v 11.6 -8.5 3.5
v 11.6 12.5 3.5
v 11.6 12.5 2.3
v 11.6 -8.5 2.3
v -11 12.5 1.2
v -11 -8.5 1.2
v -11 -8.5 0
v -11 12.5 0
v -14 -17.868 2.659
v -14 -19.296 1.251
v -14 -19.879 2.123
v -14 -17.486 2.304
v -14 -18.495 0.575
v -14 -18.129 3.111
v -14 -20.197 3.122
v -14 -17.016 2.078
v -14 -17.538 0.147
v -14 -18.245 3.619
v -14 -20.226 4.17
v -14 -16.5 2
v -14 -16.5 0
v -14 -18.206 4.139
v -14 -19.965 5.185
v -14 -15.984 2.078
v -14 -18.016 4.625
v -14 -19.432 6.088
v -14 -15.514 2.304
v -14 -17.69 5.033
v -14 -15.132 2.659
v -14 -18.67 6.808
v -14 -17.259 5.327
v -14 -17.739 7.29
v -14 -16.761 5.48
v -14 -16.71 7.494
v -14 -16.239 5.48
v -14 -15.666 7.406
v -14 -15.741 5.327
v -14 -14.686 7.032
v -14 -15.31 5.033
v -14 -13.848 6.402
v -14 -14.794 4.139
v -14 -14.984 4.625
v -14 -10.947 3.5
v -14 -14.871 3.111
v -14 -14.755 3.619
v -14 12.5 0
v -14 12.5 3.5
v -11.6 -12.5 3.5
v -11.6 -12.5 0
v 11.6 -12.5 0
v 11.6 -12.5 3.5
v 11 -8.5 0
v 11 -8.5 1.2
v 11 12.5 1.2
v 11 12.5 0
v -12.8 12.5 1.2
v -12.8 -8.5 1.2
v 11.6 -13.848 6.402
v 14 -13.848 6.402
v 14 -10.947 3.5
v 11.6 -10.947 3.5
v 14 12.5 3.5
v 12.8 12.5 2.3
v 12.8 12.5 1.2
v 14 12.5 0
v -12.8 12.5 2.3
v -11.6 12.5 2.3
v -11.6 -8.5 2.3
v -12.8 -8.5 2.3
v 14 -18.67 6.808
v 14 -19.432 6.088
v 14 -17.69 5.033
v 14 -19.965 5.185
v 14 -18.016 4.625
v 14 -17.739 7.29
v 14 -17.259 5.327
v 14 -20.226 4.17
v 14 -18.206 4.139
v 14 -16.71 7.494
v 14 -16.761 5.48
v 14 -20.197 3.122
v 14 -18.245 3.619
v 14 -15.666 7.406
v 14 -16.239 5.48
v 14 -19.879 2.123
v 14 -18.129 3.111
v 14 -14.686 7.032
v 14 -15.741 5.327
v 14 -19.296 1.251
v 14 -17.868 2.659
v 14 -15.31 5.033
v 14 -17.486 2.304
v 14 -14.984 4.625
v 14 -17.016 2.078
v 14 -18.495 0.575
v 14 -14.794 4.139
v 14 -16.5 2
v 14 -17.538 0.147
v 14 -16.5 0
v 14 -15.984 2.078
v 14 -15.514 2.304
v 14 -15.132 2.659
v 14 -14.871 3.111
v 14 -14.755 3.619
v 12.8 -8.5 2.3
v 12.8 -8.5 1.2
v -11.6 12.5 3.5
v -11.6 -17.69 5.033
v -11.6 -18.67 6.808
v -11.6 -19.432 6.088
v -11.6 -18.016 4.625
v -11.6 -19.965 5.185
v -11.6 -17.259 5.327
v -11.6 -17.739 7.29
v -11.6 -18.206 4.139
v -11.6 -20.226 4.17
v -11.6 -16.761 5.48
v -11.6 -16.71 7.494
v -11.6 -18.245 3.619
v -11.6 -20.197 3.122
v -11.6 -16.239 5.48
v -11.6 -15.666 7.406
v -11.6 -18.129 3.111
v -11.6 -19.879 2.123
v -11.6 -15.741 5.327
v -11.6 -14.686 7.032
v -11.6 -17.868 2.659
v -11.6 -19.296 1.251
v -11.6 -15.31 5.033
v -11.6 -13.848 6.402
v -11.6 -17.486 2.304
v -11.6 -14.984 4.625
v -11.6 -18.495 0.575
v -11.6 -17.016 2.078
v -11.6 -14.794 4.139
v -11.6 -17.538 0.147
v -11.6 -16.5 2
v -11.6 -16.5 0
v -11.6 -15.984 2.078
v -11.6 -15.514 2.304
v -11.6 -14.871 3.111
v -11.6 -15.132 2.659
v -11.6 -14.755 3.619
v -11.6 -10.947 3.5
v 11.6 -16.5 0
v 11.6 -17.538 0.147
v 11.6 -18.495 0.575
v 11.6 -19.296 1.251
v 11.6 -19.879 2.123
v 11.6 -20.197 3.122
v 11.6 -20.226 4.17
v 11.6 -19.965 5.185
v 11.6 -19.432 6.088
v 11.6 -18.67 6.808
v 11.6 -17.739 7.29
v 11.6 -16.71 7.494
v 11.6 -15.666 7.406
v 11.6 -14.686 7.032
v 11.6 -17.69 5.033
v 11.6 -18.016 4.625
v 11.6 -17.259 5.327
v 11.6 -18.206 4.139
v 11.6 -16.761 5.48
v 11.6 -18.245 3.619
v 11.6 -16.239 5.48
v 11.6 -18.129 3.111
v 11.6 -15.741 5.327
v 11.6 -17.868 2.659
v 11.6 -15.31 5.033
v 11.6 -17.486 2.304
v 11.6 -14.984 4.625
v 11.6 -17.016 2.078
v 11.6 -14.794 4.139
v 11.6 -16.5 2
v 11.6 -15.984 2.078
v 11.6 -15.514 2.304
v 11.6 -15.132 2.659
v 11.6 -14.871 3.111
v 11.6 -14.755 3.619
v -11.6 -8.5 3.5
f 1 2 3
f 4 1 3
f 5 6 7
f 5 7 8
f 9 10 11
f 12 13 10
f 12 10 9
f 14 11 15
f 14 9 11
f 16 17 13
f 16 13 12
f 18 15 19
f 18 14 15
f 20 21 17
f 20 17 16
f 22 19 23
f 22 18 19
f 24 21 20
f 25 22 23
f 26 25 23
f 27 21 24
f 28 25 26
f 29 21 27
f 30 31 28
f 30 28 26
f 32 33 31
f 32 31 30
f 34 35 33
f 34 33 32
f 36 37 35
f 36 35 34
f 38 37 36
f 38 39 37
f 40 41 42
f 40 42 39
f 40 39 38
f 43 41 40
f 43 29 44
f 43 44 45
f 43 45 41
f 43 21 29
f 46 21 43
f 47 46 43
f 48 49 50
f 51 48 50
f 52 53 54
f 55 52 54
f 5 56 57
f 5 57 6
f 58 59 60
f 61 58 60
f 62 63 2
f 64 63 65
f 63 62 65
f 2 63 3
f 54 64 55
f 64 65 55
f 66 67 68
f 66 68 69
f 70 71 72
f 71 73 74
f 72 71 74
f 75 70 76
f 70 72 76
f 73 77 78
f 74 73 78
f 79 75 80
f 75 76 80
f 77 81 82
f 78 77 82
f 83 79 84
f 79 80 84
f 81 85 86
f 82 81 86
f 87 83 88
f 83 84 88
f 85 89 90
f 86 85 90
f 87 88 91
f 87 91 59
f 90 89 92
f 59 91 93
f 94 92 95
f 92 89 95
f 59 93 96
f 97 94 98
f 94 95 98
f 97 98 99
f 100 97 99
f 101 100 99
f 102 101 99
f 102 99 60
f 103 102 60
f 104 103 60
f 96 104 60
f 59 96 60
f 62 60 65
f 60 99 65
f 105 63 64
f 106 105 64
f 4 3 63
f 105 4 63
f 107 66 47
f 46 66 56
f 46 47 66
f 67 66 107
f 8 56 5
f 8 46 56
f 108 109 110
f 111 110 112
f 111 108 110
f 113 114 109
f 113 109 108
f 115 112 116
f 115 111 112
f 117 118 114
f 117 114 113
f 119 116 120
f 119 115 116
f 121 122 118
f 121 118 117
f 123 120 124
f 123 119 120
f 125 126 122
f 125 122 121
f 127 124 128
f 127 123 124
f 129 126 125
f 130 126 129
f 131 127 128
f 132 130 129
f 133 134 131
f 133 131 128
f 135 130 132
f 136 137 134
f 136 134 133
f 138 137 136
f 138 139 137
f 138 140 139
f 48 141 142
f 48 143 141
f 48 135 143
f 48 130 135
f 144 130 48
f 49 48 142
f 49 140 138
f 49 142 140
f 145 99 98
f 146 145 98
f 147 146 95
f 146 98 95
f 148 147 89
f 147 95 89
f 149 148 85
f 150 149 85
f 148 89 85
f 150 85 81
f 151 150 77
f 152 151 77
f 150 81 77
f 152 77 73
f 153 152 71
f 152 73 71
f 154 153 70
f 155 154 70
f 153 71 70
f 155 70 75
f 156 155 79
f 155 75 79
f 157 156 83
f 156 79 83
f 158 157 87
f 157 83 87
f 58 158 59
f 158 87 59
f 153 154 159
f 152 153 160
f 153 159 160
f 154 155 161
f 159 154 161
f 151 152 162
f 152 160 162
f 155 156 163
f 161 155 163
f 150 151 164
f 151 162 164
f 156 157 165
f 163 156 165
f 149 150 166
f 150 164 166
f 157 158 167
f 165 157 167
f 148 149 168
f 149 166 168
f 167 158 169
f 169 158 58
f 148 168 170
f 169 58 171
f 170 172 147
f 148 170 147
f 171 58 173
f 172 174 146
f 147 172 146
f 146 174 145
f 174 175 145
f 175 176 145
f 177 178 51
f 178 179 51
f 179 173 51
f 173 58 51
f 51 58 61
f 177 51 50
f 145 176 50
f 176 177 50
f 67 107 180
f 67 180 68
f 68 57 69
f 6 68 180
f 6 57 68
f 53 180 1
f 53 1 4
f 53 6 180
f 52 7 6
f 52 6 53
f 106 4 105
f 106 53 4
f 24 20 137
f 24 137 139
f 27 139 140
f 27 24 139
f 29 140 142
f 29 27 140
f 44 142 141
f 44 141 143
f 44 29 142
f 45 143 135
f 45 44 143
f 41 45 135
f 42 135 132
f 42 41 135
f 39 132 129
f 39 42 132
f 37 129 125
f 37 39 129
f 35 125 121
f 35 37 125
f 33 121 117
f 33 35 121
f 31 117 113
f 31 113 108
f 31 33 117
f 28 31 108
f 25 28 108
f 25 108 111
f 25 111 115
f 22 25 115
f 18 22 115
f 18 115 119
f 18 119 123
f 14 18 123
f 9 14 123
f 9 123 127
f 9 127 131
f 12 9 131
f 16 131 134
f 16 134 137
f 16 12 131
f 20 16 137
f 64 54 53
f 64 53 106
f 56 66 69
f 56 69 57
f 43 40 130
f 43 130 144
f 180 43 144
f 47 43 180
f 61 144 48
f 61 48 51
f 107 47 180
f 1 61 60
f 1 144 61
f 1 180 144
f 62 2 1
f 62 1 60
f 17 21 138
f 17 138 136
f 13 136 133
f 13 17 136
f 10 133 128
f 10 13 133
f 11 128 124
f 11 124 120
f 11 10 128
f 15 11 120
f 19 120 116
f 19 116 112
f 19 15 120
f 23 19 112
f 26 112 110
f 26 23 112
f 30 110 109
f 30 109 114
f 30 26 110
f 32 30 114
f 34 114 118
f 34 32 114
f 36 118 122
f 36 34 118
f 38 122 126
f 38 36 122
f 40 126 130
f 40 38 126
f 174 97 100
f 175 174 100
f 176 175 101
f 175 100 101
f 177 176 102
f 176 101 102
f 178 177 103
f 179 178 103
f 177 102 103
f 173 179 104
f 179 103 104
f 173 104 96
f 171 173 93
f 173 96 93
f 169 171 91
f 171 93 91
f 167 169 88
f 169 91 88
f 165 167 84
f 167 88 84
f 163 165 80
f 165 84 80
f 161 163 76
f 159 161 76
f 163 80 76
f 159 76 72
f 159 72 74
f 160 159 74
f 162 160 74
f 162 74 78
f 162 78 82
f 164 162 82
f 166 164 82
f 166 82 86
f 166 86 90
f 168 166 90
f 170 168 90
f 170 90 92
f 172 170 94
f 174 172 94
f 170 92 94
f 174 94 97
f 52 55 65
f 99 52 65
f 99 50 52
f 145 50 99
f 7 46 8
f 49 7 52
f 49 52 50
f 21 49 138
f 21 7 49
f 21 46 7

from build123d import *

# Parameters (mm, degrees)
SCHIZZO1_W                   = 28
SCHIZZO1_H                   = 25
ESTRUSIONE_ESTRUSIONE1_DEPTH = 1.2
SCHIZZO4_W                   = 22
SCHIZZO4_H                   = 21
TAGLIO_ESTRUSIONE1_DEPTH     = 19.806647761
SCHIZZO2_R                   = 1.75
ESTRUSIONE_ESTRUSIONE2_DEPTH = 2.4
ESTRUSIONE_ESTRUSIONE3_DEPTH = 23.146699141
SCHIZZO5_W                   = 28
SCHIZZO5_H                   = 4
ESTRUSIONE_ESTRUSIONE4_DEPTH = 2.3


with BuildPart() as part:
    # Schizzo1 → Estrusione-Estrusione1 (new body)
    with BuildSketch(Plane.XY):
        Rectangle(SCHIZZO1_W, SCHIZZO1_H)
    extrude(amount=ESTRUSIONE_ESTRUSIONE1_DEPTH)

    # Schizzo4 → Taglio-Estrusione1 (cut, through all)
    with BuildSketch(Plane.XY.offset(1.2)):
        with Locations((0, 2)):
            Rectangle(SCHIZZO4_W, SCHIZZO4_H)
    extrude(amount=-TAGLIO_ESTRUSIONE1_DEPTH, mode=Mode.SUBTRACT)

    # Schizzo2 → Estrusione-Estrusione2 (add)
    with BuildSketch(Plane(origin=(14, 0, 0), x_dir=(0, 0, -1), z_dir=(1, 0, 0))):
        with BuildLine():
            Line((0, -12.5), (0, -16.5))
            ThreePointArc((0, -16.5), (-5.185062871, -19.964548247), (-6.401650429, -13.848349571))
            Line((-6.401650429, -13.848349571), (-3.2, -10.646699141))
            Line((-3.2, -10.646699141), (-1.2, -10.646699141))
            Line((-1.2, -10.646699141), (-1.2, -12.5))
            Line((-1.2, -12.5), (0, -12.5))
        make_face()
        with Locations((-3.75, -16.5)):
            Circle(SCHIZZO2_R, mode=Mode.SUBTRACT)
    estrusione_estrusione2 = extrude(amount=-ESTRUSIONE_ESTRUSIONE2_DEPTH)

    # Schizzo3 → Estrusione-Estrusione3 (add)
    with BuildSketch(Plane(origin=(0, 12.5, 0), x_dir=(1, 0, 0), z_dir=(0, 1, 0))):
        Polygon((14, -1.2), (14, -3.5), (11.6, -3.5), (11.6, -2.3), (12.8, -2.3), (12.8, -1.2), align=None)
    estrusione_estrusione3 = extrude(amount=-ESTRUSIONE_ESTRUSIONE3_DEPTH)

    # Specchia1: Estrusione-Estrusione2, Estrusione-Estrusione3 across plane
    add(estrusione_estrusione2.mirror(Plane(origin=(0, 0, 0), x_dir=(0, 0, 1), z_dir=(1, 0, 0))))
    add(estrusione_estrusione3.mirror(Plane(origin=(0, 0, 0), x_dir=(0, 0, 1), z_dir=(1, 0, 0))))

    # Schizzo5 → Estrusione-Estrusione4 (add)
    with BuildSketch(Plane.XY.offset(1.2)):
        with Locations((0, -10.5)):
            Rectangle(SCHIZZO5_W, SCHIZZO5_H)
    extrude(amount=ESTRUSIONE_ESTRUSIONE4_DEPTH)


solid = part.part
